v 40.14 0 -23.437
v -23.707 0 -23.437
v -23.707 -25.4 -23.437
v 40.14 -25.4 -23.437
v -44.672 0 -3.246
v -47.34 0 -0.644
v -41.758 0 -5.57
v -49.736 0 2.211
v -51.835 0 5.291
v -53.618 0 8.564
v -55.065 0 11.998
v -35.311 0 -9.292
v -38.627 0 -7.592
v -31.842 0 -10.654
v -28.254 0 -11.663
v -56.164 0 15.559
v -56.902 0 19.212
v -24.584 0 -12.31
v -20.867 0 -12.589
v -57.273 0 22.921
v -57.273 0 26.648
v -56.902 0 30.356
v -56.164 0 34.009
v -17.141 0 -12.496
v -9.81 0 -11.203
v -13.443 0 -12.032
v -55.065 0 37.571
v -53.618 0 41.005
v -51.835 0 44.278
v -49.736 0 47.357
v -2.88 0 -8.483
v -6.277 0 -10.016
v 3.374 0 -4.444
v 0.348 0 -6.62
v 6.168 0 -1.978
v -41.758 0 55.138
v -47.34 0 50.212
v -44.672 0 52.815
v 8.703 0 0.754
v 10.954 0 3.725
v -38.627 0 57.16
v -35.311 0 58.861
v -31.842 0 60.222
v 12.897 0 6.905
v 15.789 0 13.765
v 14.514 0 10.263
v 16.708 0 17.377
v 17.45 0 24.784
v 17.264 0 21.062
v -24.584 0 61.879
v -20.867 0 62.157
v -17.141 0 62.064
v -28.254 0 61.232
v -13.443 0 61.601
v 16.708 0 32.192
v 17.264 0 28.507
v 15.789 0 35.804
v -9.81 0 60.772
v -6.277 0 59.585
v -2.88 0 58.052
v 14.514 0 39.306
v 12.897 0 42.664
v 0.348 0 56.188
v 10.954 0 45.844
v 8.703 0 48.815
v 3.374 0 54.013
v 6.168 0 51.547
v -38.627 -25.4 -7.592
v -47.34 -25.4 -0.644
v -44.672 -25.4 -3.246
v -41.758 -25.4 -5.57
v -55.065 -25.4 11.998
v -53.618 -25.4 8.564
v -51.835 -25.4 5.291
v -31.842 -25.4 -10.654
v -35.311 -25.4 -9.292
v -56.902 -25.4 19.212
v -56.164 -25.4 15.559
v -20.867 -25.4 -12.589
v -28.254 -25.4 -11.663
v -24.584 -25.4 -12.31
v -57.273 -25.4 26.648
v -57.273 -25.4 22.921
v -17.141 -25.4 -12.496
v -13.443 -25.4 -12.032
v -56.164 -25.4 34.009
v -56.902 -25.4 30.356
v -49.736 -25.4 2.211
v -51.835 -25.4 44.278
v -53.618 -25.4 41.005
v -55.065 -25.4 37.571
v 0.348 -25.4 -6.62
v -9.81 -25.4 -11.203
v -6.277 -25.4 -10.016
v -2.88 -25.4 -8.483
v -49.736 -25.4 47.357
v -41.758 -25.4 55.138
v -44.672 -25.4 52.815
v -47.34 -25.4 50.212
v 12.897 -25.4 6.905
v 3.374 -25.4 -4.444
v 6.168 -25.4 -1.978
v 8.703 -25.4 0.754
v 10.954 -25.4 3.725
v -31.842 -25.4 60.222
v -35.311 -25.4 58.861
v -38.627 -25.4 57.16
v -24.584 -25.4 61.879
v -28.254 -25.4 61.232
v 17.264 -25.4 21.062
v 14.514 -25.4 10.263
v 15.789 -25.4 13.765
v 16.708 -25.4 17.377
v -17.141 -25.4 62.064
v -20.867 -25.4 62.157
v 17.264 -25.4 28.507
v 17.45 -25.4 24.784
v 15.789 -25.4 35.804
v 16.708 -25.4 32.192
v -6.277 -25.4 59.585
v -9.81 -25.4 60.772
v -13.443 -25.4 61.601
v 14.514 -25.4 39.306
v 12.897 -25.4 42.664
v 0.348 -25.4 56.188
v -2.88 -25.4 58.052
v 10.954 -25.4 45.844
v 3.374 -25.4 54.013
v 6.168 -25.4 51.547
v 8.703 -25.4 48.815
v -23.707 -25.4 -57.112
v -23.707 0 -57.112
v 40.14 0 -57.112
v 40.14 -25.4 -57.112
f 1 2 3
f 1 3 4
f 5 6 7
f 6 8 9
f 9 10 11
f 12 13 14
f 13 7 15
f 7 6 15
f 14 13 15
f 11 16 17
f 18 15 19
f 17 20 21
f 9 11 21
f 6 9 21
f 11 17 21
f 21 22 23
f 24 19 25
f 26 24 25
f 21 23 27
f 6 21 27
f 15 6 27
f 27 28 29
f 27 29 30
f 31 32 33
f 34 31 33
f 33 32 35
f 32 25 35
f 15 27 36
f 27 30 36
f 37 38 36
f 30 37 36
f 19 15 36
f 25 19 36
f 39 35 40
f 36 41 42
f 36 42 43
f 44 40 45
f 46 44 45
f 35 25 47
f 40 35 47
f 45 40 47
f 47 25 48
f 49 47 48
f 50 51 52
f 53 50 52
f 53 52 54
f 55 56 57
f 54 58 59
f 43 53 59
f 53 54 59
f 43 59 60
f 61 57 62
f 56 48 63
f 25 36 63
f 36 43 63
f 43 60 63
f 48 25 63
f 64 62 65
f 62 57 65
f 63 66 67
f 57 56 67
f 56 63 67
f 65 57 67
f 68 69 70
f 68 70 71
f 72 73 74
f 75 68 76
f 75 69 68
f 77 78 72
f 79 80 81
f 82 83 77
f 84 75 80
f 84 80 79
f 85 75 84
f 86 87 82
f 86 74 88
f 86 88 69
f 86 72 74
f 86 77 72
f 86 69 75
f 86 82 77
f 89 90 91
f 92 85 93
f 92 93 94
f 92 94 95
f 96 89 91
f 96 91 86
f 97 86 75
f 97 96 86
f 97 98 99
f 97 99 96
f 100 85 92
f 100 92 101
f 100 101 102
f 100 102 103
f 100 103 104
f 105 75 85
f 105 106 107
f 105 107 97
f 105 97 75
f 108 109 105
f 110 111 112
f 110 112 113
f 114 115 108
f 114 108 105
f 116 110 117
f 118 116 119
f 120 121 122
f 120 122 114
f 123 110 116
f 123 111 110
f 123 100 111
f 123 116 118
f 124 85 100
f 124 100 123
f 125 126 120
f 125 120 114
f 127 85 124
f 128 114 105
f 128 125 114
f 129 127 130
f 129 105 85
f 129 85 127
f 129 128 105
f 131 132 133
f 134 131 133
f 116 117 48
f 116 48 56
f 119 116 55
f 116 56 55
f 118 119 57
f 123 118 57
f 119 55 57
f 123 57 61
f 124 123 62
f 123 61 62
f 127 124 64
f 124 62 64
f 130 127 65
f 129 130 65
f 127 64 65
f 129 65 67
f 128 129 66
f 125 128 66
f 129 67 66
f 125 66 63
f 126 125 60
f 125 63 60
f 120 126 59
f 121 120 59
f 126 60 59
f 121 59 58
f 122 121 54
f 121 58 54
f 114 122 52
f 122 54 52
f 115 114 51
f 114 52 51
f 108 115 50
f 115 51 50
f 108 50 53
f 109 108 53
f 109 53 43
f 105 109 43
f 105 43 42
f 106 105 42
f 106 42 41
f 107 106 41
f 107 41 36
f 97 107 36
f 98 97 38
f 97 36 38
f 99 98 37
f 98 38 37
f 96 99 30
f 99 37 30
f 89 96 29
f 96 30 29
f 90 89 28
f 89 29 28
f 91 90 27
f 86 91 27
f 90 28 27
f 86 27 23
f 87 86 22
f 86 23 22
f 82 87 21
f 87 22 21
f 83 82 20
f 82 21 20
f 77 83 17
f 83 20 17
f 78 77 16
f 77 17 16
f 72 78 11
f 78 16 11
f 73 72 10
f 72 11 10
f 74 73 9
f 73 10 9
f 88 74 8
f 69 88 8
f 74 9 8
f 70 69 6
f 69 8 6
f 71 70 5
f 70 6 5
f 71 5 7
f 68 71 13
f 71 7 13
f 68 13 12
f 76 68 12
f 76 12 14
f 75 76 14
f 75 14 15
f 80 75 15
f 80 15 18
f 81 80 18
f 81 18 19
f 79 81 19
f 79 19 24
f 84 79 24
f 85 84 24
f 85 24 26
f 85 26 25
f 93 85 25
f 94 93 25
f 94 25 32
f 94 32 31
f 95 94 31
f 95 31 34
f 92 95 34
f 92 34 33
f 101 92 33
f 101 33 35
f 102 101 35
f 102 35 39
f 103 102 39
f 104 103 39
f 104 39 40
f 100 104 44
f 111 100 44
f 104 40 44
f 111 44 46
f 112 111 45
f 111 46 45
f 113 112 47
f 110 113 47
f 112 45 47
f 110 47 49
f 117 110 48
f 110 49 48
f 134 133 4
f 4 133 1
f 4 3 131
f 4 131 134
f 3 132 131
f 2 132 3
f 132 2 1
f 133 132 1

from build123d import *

# Parameters (mm, degrees)
F0_R     = 37.3846562125
F1_DEPTH = 25.4
F0_W     = 63.8463646173
F0_H     = 33.6742438376
F3_DEPTH = 3683
F4_R     = 7.4510701555
F5_DEPTH = 3683


# Not quite as in the source:
# - a feature names something its author has since deleted; it is built from what else it names


with BuildPart() as f1:
    # F0 (on Front) → F1 (new body)
    with BuildSketch(Plane.XZ):
        with Locations((-19.9351515621, 24.7842408717)):
            Circle(F0_R)
    extrude(amount=F1_DEPTH)

    # F0 (on Front) → F3 (cut)
    with BuildSketch(Plane.XZ):
        with Locations((-19.9351515621, 24.7842408717)):
            Circle(F0_R)
        with Locations((8.2165151834, -40.2743946761)):
            Rectangle(F0_W, F0_H)
    extrude(amount=-F3_DEPTH, mode=Mode.SUBTRACT)

    # F4 (on Front) + F0 (on Front) → F5 (cut)
    with BuildSketch(Plane.XZ):
        with Locations((-10.7757588848, 47.1439398825)):
            Circle(F4_R)
    with BuildSketch(Plane.XZ):
        with Locations((-19.9351515621, 24.7842408717)):
            Circle(F0_R)
        with Locations((8.2165151834, -40.2743946761)):
            Rectangle(F0_W, F0_H)
    extrude(amount=-F5_DEPTH, mode=Mode.SUBTRACT)


with BuildPart() as f1b:
    # F0 (on Front) → F1, piece 2 (new body)
    with BuildSketch(Plane.XZ):
        with Locations((8.2165151834, -40.2743946761)):
            Rectangle(F0_W, F0_H)
    extrude(amount=F1_DEPTH)


solid = Compound([f1.part, f1b.part])
